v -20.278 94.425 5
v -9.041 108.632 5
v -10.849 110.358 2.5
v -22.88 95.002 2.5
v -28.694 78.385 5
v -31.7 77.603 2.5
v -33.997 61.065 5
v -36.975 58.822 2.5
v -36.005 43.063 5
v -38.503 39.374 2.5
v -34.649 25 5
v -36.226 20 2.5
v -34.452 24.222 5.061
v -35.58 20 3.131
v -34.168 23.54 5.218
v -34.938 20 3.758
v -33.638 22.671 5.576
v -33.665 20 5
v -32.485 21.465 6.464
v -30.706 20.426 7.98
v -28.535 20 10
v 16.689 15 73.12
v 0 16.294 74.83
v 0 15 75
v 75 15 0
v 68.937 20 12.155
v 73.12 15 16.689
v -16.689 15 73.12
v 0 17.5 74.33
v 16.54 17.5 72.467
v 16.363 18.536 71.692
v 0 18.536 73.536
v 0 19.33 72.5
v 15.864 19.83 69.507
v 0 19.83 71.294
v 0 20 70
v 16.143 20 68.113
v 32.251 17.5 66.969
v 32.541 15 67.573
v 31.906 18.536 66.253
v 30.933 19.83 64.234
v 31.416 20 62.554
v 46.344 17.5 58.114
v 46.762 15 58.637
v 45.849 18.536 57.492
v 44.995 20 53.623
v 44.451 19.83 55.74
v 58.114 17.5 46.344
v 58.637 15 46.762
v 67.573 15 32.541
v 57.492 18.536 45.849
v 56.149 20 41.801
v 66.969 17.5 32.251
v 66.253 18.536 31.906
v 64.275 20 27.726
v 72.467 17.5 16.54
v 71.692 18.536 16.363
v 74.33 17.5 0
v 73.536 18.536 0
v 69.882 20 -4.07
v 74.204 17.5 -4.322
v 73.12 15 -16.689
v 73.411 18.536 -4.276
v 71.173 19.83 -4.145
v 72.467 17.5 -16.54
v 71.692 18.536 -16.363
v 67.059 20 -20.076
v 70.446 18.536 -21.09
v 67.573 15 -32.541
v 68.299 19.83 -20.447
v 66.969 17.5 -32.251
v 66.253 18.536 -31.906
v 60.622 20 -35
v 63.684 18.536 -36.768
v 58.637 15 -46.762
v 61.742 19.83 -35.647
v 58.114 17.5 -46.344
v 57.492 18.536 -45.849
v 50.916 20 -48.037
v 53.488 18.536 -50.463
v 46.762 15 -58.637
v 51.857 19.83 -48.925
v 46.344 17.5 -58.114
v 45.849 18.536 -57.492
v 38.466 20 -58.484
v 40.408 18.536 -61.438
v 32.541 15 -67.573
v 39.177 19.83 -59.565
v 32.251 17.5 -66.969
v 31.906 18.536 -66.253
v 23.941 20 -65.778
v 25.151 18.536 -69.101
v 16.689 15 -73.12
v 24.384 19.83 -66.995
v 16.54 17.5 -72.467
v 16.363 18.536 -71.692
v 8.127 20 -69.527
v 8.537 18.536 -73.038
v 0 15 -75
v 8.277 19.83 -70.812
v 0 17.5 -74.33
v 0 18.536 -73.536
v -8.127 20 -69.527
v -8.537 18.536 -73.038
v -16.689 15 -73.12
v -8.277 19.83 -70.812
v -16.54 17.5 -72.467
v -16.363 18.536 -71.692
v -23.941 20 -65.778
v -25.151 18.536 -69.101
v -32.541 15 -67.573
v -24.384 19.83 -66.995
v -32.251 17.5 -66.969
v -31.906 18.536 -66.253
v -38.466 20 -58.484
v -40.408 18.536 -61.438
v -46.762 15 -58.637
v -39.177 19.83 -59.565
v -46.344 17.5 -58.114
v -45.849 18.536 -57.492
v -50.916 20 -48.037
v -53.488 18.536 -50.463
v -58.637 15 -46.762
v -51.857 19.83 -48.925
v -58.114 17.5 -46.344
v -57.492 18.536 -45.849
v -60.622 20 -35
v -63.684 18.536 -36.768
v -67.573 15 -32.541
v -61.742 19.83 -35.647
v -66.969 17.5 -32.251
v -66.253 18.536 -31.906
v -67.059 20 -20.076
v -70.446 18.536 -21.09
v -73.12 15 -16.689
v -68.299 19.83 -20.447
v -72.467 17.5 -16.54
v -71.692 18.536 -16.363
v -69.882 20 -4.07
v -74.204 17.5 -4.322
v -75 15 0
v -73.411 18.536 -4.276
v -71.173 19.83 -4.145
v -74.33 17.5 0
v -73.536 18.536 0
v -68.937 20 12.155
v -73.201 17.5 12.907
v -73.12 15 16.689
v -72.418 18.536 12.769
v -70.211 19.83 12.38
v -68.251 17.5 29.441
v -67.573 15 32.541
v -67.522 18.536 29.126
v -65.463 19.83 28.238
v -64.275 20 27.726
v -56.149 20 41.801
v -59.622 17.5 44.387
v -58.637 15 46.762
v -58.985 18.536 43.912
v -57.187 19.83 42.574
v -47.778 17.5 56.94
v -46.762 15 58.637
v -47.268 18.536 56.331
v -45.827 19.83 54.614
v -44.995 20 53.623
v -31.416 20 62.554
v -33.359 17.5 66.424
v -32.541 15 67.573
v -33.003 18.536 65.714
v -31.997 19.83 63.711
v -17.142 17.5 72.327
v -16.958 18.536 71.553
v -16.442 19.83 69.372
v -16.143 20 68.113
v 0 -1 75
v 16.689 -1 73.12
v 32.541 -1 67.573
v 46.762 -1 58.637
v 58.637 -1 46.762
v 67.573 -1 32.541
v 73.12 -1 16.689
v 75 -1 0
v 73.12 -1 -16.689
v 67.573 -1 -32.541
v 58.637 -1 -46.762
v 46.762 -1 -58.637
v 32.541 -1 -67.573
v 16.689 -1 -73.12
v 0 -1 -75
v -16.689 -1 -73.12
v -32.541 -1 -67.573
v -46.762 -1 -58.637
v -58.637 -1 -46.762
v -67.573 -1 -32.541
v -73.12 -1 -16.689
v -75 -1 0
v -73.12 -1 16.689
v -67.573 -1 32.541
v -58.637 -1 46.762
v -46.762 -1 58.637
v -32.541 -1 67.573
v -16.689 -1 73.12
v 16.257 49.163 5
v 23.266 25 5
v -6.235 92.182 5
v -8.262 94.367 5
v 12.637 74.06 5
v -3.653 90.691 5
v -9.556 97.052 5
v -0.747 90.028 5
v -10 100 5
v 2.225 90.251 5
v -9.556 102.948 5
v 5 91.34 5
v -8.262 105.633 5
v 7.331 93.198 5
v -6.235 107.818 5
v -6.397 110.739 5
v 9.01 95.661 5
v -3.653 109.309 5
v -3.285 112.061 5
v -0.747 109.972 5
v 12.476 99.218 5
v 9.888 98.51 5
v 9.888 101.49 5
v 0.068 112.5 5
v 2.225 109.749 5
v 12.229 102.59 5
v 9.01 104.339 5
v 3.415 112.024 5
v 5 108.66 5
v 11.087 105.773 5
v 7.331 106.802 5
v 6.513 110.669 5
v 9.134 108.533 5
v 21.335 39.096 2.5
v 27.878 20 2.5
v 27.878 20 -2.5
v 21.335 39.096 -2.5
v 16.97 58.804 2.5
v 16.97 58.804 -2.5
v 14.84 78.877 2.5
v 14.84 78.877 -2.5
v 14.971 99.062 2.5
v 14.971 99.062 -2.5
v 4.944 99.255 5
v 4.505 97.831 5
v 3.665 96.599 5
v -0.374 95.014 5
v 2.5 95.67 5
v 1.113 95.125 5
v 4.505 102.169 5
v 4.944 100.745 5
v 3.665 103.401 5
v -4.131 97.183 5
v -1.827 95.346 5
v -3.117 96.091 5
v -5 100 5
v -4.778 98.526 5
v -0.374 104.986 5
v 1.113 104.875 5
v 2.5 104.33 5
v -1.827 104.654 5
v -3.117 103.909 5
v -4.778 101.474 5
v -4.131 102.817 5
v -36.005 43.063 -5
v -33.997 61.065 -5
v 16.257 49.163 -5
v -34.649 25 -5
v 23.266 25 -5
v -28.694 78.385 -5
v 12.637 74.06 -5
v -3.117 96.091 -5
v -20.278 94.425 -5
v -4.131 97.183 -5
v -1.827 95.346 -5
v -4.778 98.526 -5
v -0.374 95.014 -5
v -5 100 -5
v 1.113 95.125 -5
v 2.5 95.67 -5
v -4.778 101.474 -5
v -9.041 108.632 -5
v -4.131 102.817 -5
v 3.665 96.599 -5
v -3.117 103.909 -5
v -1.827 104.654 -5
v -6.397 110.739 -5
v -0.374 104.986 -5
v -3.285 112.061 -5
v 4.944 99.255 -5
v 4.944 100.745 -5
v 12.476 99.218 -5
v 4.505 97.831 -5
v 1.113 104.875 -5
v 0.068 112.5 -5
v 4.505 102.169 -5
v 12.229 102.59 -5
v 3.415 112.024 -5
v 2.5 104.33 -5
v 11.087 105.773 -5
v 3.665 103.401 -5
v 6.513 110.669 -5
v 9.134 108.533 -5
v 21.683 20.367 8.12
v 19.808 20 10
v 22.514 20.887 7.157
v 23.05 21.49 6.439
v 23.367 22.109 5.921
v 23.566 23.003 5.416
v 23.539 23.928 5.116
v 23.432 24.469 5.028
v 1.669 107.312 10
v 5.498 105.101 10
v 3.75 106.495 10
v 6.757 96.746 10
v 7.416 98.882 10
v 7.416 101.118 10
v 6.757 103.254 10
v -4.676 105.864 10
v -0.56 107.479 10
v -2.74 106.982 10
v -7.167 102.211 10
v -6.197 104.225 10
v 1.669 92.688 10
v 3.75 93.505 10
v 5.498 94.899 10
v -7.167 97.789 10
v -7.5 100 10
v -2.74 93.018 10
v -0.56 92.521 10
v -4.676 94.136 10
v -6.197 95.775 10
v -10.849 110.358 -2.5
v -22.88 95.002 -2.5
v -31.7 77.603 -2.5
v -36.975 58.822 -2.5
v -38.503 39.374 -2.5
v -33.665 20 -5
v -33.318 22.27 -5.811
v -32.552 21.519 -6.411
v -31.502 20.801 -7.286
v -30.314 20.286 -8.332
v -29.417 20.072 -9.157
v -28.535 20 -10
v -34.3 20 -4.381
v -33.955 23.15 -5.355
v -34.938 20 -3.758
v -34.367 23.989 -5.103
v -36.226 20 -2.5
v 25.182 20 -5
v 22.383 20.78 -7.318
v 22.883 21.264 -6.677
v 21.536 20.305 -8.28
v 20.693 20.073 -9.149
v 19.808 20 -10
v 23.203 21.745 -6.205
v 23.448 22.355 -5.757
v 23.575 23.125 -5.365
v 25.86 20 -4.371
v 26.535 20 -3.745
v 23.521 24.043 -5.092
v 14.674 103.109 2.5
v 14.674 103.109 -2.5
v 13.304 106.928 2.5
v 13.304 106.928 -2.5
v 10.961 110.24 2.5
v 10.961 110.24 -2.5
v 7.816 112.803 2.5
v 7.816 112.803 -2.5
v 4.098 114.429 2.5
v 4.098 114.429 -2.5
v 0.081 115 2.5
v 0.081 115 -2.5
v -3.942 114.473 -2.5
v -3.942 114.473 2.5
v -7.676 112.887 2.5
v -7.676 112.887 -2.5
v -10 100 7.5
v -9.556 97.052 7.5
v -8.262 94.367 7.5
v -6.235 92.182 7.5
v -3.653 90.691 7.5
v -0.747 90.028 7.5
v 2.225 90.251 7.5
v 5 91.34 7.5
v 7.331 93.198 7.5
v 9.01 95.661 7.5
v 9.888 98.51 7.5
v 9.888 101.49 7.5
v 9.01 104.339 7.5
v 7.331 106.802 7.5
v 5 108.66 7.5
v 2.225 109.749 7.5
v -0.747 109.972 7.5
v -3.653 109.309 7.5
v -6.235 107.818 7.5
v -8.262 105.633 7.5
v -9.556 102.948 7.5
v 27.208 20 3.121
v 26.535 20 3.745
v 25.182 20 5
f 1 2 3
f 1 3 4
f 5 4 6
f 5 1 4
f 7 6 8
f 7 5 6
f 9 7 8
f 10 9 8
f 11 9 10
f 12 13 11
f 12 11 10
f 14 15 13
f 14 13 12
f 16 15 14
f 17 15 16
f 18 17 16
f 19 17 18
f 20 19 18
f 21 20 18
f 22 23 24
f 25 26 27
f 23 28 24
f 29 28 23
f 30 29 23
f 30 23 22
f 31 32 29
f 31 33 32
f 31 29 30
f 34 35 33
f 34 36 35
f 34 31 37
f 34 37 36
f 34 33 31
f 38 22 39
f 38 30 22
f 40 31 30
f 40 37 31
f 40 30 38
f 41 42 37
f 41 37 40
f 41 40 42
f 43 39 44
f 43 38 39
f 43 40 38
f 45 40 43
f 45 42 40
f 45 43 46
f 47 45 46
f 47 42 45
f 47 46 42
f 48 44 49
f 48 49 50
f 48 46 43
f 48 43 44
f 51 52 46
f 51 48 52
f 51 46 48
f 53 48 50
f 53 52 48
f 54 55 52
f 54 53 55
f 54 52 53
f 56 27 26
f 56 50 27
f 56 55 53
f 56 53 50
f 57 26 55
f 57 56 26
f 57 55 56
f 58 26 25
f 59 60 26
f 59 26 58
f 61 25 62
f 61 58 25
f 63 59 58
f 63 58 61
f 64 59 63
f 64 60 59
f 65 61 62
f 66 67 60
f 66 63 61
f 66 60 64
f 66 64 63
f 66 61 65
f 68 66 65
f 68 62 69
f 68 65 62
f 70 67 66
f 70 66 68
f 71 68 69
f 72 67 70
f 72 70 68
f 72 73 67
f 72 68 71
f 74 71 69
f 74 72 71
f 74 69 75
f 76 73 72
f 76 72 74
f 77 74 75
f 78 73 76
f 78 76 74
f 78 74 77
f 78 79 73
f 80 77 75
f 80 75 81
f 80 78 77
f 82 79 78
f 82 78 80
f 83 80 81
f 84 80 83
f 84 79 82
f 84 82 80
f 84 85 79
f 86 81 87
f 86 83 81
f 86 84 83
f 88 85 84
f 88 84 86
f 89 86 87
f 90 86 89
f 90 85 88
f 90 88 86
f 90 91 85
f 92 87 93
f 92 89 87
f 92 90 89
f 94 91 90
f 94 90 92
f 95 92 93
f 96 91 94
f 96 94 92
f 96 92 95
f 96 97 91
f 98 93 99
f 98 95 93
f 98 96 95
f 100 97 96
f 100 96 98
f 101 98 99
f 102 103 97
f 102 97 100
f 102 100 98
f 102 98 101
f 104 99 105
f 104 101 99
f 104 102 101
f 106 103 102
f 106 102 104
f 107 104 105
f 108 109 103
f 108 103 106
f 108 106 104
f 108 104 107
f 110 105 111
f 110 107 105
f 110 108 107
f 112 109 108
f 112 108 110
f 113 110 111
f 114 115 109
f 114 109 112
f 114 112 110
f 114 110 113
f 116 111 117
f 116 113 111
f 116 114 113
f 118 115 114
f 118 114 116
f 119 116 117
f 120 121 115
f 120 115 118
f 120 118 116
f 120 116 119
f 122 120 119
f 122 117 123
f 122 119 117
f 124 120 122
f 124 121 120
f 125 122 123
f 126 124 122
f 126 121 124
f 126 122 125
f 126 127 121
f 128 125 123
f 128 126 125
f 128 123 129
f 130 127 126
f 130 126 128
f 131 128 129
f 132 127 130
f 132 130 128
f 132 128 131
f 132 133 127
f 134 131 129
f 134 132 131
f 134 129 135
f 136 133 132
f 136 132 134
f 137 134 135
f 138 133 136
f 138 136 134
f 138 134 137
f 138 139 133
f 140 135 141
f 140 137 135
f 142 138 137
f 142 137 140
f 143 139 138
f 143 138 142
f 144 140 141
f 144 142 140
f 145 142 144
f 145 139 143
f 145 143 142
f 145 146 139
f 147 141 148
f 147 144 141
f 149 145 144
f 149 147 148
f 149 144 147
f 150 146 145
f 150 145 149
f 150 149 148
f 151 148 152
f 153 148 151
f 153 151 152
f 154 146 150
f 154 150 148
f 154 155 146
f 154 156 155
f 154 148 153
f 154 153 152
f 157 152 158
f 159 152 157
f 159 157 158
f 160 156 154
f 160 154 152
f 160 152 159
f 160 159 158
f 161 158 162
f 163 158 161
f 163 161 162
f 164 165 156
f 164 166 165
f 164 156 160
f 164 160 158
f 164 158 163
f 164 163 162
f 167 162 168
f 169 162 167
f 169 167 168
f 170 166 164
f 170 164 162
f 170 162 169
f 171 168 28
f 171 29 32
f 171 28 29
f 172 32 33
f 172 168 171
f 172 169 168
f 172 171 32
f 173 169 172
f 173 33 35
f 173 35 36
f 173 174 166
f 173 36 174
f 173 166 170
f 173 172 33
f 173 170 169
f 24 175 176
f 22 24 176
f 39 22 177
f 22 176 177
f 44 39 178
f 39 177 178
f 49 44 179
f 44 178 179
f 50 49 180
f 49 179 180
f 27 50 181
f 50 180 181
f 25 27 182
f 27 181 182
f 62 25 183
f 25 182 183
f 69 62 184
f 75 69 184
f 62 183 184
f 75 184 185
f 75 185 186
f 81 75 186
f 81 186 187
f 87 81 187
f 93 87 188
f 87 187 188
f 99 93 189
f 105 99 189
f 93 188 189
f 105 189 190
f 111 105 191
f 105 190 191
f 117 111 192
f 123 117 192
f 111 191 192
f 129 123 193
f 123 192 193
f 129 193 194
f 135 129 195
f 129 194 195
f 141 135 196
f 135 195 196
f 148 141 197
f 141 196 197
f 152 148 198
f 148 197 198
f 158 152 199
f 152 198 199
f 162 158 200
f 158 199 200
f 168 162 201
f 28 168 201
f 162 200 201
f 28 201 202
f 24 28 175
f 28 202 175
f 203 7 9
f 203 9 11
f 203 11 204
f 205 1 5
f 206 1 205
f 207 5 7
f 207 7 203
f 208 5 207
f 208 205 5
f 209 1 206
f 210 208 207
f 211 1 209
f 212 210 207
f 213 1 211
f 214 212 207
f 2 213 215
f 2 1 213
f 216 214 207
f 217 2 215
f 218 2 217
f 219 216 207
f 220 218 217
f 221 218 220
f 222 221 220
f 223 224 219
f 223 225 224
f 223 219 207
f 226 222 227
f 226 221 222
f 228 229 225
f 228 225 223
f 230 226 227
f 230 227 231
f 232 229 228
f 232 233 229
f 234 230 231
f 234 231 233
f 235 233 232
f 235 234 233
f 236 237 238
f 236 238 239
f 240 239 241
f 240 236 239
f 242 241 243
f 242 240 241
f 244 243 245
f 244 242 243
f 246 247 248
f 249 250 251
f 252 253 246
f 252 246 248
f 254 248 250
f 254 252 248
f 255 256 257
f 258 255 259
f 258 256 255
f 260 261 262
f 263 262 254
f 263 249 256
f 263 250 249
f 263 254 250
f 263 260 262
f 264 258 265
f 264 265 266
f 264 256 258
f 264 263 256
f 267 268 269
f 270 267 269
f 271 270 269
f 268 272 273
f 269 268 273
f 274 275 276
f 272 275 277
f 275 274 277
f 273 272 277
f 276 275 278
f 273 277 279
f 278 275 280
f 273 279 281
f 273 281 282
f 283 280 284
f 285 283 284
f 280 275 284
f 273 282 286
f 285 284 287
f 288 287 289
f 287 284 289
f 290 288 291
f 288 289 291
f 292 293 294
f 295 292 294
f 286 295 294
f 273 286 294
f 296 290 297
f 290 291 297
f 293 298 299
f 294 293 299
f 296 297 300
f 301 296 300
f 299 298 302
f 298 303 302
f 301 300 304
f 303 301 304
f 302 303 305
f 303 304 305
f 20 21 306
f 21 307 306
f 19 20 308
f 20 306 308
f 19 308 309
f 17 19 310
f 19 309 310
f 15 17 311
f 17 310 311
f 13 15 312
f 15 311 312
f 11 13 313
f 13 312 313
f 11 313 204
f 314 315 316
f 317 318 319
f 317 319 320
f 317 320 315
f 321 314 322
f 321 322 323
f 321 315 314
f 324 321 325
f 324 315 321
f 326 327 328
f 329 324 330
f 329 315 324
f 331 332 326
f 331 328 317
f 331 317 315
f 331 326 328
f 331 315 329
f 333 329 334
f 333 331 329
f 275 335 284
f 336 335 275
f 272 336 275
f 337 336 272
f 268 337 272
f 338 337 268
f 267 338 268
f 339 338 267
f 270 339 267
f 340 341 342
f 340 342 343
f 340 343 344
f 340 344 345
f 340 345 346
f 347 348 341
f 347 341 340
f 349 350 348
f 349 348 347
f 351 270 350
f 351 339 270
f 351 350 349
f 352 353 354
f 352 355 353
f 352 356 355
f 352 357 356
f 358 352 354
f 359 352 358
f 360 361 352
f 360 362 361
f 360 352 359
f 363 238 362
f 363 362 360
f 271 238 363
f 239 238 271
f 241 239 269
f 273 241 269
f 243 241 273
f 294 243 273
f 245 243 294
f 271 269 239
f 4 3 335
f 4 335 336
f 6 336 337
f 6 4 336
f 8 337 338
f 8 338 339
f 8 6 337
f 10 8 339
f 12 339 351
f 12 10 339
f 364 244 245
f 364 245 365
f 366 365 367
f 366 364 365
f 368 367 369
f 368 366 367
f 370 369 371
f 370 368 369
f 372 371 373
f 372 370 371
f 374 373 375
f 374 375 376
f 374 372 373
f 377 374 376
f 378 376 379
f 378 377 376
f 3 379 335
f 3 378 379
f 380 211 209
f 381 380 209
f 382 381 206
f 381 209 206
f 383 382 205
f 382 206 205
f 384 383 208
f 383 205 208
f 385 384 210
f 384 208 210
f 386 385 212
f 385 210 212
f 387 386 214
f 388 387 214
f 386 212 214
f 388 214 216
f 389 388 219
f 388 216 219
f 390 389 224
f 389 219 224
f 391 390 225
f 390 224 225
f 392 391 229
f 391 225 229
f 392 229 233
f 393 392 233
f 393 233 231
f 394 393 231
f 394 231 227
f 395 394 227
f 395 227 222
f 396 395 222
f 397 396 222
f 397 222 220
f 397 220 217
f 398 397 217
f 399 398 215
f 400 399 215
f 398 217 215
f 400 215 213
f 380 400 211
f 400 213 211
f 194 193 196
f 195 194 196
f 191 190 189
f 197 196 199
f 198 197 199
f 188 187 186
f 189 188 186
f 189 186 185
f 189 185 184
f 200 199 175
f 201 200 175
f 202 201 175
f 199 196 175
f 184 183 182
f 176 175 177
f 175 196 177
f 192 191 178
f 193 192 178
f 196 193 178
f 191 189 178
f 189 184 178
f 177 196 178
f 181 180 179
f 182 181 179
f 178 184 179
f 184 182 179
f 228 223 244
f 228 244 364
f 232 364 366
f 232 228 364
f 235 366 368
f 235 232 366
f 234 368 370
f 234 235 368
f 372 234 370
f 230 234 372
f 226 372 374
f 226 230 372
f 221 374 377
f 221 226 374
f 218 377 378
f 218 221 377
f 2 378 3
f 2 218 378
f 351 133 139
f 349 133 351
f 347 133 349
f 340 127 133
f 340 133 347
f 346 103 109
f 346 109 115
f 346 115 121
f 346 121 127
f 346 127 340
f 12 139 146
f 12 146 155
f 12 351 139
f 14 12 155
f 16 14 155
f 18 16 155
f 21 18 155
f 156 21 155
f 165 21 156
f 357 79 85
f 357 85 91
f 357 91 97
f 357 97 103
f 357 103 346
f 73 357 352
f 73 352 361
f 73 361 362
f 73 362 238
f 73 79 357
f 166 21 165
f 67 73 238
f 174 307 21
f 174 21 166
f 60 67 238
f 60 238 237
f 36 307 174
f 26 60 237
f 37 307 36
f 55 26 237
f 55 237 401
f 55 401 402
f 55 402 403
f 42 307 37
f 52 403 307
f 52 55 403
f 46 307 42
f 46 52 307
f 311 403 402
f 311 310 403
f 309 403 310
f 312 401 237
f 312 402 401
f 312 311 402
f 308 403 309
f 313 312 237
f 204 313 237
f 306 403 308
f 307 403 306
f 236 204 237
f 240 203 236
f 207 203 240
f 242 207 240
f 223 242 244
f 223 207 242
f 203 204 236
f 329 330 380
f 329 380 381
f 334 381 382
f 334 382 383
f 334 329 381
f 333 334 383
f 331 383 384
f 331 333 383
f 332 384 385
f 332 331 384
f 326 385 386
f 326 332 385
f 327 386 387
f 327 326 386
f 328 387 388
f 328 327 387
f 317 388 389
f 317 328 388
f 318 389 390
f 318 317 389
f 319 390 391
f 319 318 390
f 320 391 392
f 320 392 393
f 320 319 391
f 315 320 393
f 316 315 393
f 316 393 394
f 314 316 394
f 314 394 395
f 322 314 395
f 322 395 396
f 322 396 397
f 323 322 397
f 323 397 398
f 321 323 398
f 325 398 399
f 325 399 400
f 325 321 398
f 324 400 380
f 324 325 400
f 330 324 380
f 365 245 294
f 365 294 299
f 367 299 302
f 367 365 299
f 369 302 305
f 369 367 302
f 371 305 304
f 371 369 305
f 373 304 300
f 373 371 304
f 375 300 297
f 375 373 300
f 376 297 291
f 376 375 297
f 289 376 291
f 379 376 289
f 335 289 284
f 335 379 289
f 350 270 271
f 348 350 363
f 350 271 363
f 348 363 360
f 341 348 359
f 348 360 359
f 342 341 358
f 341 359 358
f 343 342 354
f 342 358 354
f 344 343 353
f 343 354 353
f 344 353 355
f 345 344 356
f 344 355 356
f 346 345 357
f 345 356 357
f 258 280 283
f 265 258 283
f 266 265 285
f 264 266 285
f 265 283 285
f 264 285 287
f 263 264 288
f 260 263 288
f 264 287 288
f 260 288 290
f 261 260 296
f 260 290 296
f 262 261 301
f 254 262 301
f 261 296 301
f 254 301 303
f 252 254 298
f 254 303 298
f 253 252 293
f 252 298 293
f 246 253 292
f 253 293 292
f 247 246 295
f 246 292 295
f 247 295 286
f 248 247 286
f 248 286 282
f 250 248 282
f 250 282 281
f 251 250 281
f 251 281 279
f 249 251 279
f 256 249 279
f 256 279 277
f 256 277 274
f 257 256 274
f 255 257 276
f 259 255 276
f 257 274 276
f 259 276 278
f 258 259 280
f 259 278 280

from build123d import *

# Parameters (mm, degrees)
BOSS_EXTRUDE1_DEPTH      = 20
BOSS_EXTRUDE1_DEPTH_BACK = 1
SKETCH1_R                = 75
FILLET1_R                = 5
BOSS_EXTRUDE2_DEPTH      = 5
CHAMFER1_SIZE            = 2.5
FILLET2_R                = 5
SKETCH4_R                = 10
BOSS_EXTRUDE3_DEPTH      = 5
CHAMFER2_SIZE            = 2.5
SKETCH5_R                = 5
CUT_EXTRUDE1_DEPTH       = 10


with BuildPart() as part:
    # Sketch1 → Boss-Extrude1 (new, two sides: drawn at the far end of the back side and taken through both)
    with BuildSketch(Plane(origin=(0, 0, 0), x_dir=(1, 0, 0), z_dir=(0, 1, 0)).offset(-BOSS_EXTRUDE1_DEPTH_BACK)):
        with Locations(Location((0, 0, 0), (0, 0, 270))):
            Circle(SKETCH1_R)
    extrude(amount=BOSS_EXTRUDE1_DEPTH + BOSS_EXTRUDE1_DEPTH_BACK)

    # Fillet1
    fillet1_edges = [part.edges().sort_by_distance(p)[0] for p in [
        (0, 20, -75),
    ]]
    fillet(fillet1_edges, radius=FILLET1_R)

    # Sketch3 → Boss-Extrude2 (add, symmetric)
    with BuildSketch(Plane.XY):
        with BuildLine():
            Line((-35, 15), (30, 15))
            ThreePointArc((30, 15), (17.428098582, 56.126843631), (14.970645506, 99.06203778))
            ThreePointArc((14.970645506, 99.06203778), (6.012327577, 113.742340307), (-10.849201429, 110.358321696))
            ThreePointArc((-10.849201429, 110.358321696), (-35.460543036, 65.854059614), (-35, 15))
        make_face()
    extrude(amount=BOSS_EXTRUDE2_DEPTH, both=True)

    # Chamfer1
    chamfer1_edges = [part.edges().sort_by_distance(p)[0] for p in [
        (-34.796467261, 68.341174934, -5),
        (16.970295051, 58.803839559, -5),
        (6.012327577, 113.742340307, -5),
        (16.970295051, 58.803839559, 5),
        (6.012327577, 113.742340307, 5),
        (-34.796467261, 68.341174934, 5),
    ]]
    chamfer(chamfer1_edges, length=CHAMFER1_SIZE)

    # Fillet2
    fillet2_edges = [part.edges().sort_by_distance(p)[0] for p in [
        (-4.241511046, 20, -5),
        (-4.241511046, 20, 5),
    ]]
    fillet(fillet2_edges, radius=FILLET2_R)

    # Sketch4 → Boss-Extrude3 (add)
    with BuildSketch(Plane.XY.offset(5)):
        with Locations(Location((0, 100, 0), (0, 0, 180))):
            Circle(SKETCH4_R)
    extrude(amount=BOSS_EXTRUDE3_DEPTH)

    # Chamfer2
    chamfer2_edges = [part.edges().sort_by_distance(p)[0] for p in [
        (10, 100, 10),
    ]]
    chamfer(chamfer2_edges, length=CHAMFER2_SIZE)

    # Sketch5 → Cut-Extrude1 (cut)
    with BuildSketch(Plane(origin=(0, 0, -5), x_dir=(-1, 0, 0), z_dir=(0, 0, -1))):
        with Locations((0, 100)):
            Circle(SKETCH5_R)
    extrude(amount=-CUT_EXTRUDE1_DEPTH, mode=Mode.SUBTRACT)


solid = part.part
